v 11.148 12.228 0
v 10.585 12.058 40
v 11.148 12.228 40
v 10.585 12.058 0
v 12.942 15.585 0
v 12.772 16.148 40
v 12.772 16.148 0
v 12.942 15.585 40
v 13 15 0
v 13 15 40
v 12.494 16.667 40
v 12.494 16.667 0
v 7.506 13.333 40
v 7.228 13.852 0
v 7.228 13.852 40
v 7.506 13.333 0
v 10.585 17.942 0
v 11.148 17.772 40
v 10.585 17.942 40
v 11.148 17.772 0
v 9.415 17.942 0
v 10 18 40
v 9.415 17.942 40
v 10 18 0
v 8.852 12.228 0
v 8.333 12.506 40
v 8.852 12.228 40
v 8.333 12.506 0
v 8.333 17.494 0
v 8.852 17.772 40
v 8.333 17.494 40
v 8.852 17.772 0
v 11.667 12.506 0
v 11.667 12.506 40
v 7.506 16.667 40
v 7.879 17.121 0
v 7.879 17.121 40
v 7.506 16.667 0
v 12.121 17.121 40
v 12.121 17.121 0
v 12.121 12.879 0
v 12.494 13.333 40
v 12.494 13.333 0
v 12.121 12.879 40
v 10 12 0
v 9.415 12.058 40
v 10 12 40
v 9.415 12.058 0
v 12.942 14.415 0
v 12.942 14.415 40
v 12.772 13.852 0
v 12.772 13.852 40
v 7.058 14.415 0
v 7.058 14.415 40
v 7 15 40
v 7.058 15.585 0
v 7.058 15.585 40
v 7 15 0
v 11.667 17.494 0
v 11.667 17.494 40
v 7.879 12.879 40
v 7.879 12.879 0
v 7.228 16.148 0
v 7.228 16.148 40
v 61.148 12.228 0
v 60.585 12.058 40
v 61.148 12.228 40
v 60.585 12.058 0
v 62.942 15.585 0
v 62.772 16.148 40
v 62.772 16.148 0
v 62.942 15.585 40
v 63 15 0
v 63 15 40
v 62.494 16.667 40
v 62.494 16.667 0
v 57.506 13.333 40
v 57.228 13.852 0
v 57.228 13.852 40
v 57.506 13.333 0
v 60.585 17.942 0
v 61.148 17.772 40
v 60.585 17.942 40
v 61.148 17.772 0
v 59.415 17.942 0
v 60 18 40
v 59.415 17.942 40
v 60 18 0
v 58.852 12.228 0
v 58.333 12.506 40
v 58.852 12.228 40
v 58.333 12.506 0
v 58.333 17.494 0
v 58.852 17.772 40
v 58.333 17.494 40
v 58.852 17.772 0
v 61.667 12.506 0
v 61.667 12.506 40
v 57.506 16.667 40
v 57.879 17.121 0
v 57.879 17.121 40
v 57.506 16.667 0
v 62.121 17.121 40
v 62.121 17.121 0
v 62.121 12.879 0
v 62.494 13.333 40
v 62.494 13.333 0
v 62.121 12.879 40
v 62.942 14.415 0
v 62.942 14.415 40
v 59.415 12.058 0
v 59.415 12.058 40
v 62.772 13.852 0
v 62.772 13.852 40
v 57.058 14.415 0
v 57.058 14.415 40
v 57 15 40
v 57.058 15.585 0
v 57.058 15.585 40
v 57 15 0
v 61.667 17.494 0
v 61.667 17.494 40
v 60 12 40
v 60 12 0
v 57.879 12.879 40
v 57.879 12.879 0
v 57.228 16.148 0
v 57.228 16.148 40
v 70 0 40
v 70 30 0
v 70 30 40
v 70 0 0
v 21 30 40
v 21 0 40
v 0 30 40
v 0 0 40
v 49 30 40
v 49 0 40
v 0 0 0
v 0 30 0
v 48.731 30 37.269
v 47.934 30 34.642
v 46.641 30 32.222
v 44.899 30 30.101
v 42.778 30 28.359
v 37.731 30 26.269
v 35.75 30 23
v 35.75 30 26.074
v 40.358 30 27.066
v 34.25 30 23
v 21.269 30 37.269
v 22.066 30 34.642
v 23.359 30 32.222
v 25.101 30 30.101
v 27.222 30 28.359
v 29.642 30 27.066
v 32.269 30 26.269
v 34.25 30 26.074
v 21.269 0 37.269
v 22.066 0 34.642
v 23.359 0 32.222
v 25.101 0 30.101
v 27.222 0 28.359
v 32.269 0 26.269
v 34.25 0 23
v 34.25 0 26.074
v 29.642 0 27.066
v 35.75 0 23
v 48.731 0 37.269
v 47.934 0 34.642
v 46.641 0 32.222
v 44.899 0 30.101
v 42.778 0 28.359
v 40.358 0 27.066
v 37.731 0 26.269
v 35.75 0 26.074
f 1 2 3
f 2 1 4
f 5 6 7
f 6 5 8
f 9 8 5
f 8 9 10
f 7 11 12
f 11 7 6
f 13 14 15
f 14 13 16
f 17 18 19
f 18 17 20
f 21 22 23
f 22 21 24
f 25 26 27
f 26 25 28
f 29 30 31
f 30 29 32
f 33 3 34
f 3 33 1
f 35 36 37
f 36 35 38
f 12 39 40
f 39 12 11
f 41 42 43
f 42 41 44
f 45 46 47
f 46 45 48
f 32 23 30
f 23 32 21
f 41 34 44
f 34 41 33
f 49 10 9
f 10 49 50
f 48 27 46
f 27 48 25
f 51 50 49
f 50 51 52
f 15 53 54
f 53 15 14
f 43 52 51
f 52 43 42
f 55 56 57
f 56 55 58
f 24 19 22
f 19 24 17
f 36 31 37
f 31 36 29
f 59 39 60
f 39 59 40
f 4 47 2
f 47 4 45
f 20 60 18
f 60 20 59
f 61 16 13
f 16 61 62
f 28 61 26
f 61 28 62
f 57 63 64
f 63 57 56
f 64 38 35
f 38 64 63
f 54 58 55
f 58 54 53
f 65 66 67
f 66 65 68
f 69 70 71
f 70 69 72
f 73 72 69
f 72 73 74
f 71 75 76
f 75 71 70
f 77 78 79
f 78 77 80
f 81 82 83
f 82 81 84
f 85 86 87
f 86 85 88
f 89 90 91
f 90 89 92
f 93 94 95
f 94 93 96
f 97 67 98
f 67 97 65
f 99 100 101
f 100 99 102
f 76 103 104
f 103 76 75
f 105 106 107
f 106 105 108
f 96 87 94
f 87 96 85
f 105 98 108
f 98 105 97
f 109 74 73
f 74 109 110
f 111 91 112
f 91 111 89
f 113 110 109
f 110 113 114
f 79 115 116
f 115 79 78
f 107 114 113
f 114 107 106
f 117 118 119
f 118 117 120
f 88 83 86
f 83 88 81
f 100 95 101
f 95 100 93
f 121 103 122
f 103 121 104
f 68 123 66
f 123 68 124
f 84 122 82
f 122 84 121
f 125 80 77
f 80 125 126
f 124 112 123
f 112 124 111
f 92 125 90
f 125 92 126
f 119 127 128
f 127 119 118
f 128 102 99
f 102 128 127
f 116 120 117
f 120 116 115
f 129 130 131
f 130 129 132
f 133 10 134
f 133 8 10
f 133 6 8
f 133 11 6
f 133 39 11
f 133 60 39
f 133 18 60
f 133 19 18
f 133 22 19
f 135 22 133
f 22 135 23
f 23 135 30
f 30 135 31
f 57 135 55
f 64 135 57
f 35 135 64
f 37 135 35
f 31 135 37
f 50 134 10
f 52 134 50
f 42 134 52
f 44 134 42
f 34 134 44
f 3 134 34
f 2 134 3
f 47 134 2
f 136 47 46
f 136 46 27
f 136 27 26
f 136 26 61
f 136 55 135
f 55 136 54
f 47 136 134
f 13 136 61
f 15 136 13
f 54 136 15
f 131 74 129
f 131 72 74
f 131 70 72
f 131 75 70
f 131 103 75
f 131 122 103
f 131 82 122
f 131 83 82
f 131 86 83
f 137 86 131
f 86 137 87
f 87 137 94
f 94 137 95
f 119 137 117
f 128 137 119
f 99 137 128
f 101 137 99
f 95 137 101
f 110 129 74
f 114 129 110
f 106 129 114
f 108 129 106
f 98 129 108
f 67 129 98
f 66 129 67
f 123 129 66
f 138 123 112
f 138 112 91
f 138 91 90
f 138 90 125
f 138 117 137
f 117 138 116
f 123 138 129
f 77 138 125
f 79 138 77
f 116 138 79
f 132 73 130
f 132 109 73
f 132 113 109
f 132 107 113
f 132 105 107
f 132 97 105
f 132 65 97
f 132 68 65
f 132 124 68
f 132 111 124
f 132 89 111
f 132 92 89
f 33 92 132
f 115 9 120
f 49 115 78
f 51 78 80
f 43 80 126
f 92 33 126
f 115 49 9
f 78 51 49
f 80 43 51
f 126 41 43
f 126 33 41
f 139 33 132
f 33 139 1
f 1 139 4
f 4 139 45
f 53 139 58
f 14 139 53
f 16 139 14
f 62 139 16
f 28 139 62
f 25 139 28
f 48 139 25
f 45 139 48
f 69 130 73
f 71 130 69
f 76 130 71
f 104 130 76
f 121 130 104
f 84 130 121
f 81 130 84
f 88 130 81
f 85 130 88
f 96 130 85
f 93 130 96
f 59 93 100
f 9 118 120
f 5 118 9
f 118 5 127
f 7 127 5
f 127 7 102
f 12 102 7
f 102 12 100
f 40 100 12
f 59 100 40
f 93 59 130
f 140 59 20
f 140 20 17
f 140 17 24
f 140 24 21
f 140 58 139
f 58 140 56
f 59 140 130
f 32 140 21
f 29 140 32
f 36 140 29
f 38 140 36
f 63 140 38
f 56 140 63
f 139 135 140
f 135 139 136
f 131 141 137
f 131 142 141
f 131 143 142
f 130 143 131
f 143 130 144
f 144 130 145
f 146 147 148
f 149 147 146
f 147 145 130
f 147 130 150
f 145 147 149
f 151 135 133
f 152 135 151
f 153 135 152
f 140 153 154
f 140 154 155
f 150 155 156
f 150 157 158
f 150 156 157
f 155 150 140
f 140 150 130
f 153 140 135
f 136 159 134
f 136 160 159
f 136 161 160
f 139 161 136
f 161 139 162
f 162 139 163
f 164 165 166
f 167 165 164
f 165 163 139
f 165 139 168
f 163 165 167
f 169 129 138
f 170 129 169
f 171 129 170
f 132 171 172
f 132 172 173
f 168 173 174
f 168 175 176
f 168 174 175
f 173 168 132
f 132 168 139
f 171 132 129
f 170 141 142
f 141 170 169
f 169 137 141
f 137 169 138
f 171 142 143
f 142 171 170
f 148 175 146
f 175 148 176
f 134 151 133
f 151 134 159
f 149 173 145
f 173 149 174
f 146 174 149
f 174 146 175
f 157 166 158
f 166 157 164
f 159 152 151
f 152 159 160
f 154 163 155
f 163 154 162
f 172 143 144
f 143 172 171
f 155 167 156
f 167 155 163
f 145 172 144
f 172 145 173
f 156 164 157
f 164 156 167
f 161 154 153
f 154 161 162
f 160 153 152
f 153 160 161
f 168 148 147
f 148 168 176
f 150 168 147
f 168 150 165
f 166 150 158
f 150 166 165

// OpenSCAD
$fn = 32;

// ----------------------------------------------------------------------
// Saddle clamp: split shaft clamp
// ----------------------------------------------------------------------

// --- parameters (mm) ---
blk_l = 70;               // block length, X
blk_w = 30;               // block width, Y
blk_h = 40;               // block height
clamp_r = 14;             // shaft groove radius
hole_r = 3;               // bolt hole radius
hole_m = 10;              // bolt hole margin from the ends
saw_w = 1.5;              // saw kerf width
fit_tol = 0.02;           // tolerance for press fits, mm
free_tol = 0.2;           // tolerance for clearance fits, mm

saw_depth = clamp_r + 3;  // saw kerf depth

difference() {
  cube([blk_l, blk_w, blk_h]);
  translate([blk_l / 2, -1, blk_h])
    rotate([-90, 0, 0])
      cylinder(h = blk_w + 2, r = clamp_r);
  for (sx = [0, 1])
    translate([sx ? blk_l - hole_m : hole_m, blk_w / 2, -1])
      cylinder(r = hole_r, h = blk_h + 2);
  translate([blk_l / 2 - saw_w / 2, -1, blk_h - saw_depth])
    cube([saw_w, blk_w + 2, saw_depth + 1]);
}
